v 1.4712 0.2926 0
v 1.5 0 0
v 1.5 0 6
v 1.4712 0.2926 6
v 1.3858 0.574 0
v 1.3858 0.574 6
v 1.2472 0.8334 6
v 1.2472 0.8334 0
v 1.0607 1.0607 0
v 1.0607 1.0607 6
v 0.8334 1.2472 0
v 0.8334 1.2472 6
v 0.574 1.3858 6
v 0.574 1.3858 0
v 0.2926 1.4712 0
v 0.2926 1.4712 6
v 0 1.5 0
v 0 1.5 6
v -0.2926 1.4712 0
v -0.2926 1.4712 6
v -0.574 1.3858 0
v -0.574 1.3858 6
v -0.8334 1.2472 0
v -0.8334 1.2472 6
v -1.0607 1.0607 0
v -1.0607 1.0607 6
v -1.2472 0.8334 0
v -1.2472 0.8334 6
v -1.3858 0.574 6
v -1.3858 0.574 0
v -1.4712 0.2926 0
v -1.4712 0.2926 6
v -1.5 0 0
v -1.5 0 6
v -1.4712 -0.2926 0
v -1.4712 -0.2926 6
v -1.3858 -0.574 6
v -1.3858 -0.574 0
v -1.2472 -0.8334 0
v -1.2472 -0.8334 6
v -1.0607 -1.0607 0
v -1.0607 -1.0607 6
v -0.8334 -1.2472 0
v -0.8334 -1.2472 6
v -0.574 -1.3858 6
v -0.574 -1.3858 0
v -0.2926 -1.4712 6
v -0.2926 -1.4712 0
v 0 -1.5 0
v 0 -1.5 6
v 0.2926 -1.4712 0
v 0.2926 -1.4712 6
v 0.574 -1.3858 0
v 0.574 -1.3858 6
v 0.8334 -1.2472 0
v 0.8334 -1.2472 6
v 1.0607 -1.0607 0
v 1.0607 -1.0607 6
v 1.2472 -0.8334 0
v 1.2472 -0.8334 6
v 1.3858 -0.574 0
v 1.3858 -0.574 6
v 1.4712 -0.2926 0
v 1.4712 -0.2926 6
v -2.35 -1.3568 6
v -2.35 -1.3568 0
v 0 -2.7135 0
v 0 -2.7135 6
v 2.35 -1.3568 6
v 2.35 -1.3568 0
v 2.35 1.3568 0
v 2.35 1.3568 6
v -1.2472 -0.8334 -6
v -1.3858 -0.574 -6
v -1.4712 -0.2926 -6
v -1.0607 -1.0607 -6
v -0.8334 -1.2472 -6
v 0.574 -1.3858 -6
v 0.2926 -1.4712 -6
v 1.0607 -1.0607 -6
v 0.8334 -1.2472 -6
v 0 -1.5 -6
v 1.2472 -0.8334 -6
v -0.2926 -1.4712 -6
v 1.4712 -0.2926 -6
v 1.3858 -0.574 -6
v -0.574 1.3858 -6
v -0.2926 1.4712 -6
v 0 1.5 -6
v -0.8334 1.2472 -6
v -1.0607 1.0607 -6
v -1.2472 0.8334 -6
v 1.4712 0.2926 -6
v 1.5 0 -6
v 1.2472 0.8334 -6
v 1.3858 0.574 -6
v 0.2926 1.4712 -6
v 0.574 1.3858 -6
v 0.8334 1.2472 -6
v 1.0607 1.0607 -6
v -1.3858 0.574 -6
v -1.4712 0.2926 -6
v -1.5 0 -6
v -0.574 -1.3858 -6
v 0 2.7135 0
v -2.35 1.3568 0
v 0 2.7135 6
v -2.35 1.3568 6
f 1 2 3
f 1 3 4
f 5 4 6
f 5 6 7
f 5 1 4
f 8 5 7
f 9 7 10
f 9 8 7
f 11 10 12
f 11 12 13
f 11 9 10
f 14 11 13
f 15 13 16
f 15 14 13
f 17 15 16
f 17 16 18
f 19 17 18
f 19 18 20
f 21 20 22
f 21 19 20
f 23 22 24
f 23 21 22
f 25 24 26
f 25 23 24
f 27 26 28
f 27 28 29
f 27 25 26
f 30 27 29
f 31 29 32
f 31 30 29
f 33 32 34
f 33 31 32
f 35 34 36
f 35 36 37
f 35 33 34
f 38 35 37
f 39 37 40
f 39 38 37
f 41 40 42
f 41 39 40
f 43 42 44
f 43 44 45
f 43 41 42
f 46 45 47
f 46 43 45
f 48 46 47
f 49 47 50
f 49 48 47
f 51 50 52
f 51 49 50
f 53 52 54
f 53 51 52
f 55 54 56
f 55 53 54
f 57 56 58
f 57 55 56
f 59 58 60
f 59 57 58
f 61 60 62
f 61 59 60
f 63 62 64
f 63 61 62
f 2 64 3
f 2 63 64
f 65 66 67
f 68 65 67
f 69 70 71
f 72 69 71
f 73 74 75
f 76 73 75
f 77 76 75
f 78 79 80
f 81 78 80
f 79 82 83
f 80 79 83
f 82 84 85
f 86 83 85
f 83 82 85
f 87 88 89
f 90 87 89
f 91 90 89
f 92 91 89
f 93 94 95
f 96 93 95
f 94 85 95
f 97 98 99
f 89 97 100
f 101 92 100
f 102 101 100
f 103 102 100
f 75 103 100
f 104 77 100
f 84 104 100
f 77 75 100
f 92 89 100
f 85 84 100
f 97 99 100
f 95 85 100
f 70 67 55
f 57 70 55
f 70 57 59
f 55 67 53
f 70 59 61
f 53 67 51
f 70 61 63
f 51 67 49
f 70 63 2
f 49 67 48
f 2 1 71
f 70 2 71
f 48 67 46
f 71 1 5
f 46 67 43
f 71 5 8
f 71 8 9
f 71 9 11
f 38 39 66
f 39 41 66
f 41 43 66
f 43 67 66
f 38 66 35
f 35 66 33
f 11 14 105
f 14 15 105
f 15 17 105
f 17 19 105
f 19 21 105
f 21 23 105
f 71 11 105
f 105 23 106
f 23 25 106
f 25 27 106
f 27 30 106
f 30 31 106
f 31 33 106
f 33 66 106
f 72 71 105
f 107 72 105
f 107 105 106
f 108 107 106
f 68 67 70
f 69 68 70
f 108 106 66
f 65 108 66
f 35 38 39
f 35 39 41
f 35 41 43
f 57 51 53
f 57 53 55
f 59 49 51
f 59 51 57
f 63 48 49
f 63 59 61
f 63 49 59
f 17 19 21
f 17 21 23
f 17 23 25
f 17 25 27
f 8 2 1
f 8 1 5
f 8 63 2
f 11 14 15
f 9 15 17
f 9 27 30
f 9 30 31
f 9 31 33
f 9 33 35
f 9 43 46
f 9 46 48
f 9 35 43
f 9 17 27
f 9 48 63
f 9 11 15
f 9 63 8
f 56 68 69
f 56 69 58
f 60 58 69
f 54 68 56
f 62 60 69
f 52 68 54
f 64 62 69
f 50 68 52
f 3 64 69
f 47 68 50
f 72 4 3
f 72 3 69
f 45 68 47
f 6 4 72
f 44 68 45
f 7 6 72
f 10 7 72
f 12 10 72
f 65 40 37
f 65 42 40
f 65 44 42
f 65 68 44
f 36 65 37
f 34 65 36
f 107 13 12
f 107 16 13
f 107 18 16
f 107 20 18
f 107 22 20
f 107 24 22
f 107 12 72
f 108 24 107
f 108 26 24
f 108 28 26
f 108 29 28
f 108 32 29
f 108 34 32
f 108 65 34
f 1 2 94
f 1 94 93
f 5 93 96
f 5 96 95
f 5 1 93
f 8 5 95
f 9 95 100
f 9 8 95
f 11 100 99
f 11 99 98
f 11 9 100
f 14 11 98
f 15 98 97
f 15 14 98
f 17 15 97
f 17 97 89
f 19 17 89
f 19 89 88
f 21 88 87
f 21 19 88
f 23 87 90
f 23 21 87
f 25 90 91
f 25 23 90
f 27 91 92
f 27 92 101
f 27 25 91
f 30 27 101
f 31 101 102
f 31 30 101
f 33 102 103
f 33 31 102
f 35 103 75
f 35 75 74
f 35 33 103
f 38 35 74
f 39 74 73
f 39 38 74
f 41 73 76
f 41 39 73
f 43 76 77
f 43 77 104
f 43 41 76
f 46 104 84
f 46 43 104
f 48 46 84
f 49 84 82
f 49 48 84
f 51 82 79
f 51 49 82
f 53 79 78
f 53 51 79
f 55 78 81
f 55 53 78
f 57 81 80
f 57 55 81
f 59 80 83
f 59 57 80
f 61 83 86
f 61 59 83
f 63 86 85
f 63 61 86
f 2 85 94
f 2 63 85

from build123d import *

# Parameters (mm, degrees)
SKETCH1_R           = 1.5
BOSS_EXTRUDE1_DEPTH = 6
SKETCH1_2_R         = 1.5
BOSS_EXTRUDE2_DEPTH = 6


with BuildPart() as part:
    # Sketch1 → Boss-Extrude1 (new body)
    with BuildSketch(Plane(origin=(0, 0, 0), x_dir=(0, 1, 0), z_dir=(0, 0, 1))):
        Polygon((2.713546265, 0), (1.356773133, 2.35), (-1.356773133, 2.35), (-2.713546265, 0), (-1.356773133, -2.35), (1.356773133, -2.35), align=None)
        Circle(SKETCH1_R, mode=Mode.SUBTRACT)
    extrude(amount=BOSS_EXTRUDE1_DEPTH)


with BuildPart() as body_2:
    # Sketch1<2> → Boss-Extrude2 (new body)
    with BuildSketch(Plane(origin=(0, 0, 0), x_dir=(0, 1, 0), z_dir=(0, 0, 1))):
        Circle(SKETCH1_2_R)
    extrude(amount=-BOSS_EXTRUDE2_DEPTH)


solid = Compound([part.part, body_2.part])
